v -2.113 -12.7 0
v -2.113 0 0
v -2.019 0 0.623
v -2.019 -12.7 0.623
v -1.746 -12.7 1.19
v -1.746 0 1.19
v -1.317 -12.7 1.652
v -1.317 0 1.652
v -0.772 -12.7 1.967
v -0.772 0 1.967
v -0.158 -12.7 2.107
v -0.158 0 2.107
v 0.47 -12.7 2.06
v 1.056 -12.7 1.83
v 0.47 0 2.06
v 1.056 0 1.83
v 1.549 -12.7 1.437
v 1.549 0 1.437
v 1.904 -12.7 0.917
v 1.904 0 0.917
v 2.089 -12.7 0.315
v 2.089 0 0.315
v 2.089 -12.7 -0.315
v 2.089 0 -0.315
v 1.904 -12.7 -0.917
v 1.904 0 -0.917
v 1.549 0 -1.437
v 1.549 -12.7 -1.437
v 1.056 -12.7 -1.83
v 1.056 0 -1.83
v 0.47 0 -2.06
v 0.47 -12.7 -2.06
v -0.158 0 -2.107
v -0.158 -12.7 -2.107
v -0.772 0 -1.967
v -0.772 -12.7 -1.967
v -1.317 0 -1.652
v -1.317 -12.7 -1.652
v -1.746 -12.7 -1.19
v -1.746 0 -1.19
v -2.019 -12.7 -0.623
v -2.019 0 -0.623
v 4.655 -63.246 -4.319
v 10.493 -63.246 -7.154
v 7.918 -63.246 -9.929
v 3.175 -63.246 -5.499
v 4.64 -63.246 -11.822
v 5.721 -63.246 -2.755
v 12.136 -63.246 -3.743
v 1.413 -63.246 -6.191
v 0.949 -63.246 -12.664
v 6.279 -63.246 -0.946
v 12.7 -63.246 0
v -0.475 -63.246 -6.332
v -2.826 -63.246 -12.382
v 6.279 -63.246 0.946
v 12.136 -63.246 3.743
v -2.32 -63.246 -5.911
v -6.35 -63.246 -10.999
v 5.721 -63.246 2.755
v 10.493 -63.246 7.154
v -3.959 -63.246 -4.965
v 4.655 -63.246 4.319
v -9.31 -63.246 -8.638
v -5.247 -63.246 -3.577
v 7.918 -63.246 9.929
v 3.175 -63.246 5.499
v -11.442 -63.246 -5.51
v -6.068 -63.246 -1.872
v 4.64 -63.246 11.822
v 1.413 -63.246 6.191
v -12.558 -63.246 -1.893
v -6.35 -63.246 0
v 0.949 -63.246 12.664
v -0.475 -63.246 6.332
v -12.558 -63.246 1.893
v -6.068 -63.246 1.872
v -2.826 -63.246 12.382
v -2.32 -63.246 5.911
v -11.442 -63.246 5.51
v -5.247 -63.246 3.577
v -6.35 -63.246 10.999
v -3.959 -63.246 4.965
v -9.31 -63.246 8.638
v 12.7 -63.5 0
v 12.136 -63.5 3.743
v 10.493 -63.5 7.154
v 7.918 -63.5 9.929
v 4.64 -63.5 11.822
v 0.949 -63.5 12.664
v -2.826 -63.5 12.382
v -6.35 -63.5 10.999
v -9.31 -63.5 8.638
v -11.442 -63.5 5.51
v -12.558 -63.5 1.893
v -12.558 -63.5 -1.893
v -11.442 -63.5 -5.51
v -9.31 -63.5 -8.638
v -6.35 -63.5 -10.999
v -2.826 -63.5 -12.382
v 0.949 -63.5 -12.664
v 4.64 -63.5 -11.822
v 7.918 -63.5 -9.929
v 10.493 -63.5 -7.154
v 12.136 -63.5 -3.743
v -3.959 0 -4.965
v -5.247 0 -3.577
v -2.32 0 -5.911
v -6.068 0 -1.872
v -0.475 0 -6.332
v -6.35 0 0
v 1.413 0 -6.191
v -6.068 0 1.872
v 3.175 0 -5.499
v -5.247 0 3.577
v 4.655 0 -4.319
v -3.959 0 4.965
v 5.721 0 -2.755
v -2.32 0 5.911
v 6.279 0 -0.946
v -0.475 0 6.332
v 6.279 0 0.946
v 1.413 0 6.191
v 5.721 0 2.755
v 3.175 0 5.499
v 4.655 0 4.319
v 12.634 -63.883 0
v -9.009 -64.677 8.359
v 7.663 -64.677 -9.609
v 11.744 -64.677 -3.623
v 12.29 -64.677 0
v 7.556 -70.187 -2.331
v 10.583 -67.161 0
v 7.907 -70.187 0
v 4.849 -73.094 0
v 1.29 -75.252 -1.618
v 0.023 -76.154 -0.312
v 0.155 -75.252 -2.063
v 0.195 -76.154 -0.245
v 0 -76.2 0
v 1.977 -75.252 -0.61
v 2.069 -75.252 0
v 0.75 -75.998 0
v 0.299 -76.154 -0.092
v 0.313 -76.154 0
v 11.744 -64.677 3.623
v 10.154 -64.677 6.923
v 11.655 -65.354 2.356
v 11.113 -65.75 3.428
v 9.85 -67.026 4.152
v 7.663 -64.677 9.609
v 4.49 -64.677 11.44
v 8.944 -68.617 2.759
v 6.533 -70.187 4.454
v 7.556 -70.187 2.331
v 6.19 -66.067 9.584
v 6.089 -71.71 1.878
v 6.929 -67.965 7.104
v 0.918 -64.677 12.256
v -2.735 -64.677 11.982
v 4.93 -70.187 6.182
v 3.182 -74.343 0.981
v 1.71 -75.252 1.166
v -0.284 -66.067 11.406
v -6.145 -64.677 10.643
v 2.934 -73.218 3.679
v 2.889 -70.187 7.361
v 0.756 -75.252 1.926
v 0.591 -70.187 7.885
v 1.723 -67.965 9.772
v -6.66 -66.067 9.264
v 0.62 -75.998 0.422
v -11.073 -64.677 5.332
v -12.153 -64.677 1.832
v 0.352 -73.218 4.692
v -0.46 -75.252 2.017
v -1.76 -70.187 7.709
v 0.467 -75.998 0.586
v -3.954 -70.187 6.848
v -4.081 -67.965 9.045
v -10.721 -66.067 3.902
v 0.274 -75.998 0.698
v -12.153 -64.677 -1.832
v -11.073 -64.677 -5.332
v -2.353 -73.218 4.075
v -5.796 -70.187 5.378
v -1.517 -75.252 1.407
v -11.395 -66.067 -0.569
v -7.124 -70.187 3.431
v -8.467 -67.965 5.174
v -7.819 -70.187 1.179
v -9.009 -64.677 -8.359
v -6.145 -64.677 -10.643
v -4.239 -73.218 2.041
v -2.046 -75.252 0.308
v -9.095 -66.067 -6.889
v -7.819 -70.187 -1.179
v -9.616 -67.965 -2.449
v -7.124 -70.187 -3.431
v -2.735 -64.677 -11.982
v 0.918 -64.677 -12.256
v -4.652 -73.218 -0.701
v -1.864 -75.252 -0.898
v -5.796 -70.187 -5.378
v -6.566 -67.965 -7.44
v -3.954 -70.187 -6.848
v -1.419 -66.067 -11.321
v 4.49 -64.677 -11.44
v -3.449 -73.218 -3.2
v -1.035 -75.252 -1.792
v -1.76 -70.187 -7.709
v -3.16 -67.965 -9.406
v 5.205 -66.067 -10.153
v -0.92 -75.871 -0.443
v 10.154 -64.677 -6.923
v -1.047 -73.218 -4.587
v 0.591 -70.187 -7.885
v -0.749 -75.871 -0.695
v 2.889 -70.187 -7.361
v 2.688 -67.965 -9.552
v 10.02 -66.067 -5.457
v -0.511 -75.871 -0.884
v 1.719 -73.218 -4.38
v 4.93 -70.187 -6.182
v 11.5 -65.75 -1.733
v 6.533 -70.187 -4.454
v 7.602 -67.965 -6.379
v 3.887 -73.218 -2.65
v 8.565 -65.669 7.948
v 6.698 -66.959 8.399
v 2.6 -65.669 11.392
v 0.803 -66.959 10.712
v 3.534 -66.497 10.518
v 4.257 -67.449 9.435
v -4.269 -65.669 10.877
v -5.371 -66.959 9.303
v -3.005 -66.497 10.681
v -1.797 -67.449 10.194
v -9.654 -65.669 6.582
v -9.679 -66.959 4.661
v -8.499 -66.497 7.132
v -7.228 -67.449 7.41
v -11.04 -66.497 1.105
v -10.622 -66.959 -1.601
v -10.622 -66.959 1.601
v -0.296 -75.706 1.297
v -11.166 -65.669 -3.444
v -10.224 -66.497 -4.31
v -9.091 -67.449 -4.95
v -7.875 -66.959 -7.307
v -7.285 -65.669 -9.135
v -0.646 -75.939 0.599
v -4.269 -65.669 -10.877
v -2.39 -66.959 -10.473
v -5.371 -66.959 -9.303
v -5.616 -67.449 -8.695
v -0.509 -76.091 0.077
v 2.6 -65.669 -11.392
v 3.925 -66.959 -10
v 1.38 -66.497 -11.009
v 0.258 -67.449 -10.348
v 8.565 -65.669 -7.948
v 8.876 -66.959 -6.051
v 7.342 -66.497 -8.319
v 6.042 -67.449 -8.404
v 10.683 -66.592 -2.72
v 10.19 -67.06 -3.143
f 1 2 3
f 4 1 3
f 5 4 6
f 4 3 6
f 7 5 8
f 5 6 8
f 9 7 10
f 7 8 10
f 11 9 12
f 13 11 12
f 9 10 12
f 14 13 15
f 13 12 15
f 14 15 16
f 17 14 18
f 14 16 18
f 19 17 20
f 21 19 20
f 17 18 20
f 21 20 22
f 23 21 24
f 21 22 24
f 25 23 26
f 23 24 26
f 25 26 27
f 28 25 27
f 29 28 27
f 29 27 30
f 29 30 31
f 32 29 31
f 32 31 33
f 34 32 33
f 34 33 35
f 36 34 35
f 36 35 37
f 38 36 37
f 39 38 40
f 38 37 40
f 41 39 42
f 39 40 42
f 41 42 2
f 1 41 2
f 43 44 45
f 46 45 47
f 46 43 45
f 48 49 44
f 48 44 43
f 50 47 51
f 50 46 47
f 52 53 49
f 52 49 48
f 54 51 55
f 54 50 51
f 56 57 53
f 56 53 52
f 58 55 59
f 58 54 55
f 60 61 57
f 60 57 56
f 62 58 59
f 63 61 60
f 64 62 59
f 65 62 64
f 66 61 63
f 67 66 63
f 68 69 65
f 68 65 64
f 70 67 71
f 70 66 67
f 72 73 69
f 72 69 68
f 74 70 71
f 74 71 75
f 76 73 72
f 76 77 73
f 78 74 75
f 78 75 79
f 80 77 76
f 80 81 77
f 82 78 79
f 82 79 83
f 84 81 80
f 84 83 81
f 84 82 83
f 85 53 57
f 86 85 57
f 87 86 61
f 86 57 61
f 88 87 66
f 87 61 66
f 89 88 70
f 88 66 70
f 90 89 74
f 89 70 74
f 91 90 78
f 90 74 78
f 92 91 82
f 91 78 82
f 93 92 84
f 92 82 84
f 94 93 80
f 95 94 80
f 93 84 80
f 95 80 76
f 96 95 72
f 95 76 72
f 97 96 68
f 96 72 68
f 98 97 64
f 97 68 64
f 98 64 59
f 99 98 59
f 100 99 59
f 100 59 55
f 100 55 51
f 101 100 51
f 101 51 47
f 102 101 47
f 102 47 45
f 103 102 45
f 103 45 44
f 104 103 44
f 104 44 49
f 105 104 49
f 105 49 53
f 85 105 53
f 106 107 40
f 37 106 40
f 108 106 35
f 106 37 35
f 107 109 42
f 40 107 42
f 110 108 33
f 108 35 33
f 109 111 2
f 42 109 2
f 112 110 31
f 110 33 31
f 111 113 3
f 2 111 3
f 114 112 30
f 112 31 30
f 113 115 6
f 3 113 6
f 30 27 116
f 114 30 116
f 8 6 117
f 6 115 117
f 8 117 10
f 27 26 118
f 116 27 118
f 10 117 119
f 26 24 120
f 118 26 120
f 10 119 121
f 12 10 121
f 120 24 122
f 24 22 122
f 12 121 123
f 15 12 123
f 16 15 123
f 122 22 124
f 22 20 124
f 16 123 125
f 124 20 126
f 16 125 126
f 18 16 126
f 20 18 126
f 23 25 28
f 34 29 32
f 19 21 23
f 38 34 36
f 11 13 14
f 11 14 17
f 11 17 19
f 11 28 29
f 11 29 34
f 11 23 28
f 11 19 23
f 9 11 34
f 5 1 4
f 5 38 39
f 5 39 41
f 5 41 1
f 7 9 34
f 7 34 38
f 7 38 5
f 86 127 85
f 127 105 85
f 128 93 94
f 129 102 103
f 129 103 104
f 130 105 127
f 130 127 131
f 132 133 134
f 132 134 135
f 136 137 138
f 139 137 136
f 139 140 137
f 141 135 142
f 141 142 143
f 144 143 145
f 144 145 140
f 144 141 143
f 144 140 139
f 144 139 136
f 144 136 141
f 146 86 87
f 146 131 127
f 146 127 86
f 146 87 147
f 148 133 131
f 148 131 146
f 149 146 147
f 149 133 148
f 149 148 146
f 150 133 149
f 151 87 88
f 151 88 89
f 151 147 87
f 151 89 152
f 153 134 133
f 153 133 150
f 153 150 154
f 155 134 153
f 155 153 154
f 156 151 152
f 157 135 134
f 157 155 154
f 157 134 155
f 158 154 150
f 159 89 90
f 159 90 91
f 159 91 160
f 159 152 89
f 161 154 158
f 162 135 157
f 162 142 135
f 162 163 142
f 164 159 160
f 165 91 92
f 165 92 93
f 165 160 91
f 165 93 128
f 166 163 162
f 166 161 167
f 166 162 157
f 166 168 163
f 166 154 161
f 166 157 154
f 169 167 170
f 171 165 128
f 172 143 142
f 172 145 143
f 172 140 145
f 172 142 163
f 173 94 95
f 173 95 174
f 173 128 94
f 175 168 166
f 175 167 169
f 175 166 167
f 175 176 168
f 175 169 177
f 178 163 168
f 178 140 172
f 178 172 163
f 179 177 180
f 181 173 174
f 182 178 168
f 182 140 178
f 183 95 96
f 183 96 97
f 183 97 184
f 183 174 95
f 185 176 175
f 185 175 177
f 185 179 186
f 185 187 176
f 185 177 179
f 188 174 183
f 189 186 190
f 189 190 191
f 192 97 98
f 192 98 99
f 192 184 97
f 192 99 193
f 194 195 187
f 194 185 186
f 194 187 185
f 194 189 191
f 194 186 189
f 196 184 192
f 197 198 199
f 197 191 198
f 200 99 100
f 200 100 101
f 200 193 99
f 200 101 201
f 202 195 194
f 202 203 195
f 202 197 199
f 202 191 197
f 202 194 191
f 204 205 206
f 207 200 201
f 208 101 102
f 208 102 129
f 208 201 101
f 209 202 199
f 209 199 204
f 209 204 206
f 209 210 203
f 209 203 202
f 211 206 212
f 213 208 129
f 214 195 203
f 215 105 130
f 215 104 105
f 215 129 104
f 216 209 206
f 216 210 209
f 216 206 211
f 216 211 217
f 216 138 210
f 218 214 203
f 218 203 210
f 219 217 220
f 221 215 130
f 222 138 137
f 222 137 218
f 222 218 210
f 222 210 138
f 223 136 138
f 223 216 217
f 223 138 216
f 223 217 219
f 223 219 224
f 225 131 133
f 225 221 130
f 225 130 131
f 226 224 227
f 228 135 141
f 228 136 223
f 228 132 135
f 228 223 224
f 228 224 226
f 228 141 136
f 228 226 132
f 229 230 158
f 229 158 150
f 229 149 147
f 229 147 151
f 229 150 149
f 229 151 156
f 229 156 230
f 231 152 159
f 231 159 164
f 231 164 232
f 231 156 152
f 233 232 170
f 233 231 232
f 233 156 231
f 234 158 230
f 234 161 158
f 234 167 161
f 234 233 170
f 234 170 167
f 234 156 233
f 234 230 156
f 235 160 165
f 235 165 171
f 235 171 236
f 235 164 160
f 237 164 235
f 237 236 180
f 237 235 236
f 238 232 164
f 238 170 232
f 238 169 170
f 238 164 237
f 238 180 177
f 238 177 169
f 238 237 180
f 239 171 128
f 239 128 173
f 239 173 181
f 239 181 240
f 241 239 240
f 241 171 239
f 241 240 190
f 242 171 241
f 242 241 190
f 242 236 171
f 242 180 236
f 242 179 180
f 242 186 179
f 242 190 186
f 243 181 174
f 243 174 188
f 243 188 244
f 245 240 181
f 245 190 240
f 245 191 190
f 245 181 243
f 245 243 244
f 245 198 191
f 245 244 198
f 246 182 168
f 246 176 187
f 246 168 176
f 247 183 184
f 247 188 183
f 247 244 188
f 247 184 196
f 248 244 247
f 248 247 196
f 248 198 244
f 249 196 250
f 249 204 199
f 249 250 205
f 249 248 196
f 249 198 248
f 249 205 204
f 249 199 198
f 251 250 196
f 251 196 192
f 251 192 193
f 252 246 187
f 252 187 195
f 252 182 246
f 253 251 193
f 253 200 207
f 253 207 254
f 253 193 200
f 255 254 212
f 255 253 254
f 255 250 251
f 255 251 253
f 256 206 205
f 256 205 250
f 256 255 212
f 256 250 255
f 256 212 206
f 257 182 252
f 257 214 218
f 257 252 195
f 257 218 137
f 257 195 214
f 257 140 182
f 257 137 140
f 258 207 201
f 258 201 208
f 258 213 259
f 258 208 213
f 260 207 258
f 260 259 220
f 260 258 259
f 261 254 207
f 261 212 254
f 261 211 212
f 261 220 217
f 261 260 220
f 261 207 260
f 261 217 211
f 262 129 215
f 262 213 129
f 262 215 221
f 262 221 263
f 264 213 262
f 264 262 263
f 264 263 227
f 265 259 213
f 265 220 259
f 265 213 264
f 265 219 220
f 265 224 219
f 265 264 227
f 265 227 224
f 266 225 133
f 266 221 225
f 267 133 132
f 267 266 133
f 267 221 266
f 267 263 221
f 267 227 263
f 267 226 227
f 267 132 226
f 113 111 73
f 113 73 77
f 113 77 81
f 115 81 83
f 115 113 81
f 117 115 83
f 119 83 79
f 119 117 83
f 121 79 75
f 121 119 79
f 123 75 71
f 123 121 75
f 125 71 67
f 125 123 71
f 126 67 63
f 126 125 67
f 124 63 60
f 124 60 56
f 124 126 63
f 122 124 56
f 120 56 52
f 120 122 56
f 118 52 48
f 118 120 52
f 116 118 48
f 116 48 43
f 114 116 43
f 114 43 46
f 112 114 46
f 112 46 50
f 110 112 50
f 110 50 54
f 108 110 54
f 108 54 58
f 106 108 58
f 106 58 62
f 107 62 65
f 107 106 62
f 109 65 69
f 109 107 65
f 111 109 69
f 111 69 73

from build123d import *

# Parameters (mm, degrees)
F0_R     = 12.7
F1_DEPTH = 76.2
F3_R     = 12.7
F3_R_2   = 6.35
F4_DEPTH = 63.246
F5_R     = 2.1129626077
F6_DEPTH = 12.7


# Not quite as in the source:
# - a fillet or chamfer that OpenCascade refuses, or shapes differently, is made with other operations: its cross-section is extruded or revolved along the edge and cut away or added


with BuildPart() as f1:
    # F0 (on Front) → F1 (new body)
    with BuildSketch(Plane.XZ):
        Circle(F0_R)
    extrude(amount=F1_DEPTH)

    # F2: fillet of radius 12.7 on 1 edges, made by hand

    # F2_s1 → F2_t2 (revolve, cut)
    with BuildSketch(Plane.XY):
        with BuildLine():
            add(Edge.make_bspline(
                [(12.7, -63.5), (12.7, -76.2), (0, -76.2)],
                knots=[0, 0, 0, 1, 1, 1], degree=2, weights=[1, 0.1764705882, 1]))
            Line((0, -76.2), (12.7, -76.2))
            Line((12.7, -76.2), (12.7, -63.5))
        make_face()
    revolve(axis=Axis((0, -76.2, 0), (0, -1, 0)), mode=Mode.SUBTRACT)

    # F3 (on face) → F4 (cut)
    with BuildSketch(Plane(origin=(0, 0, 0), x_dir=(-1, 0, 0), z_dir=(0, 1, 0))):
        Circle(F3_R)
        Circle(F3_R_2, mode=Mode.SUBTRACT)
    extrude(amount=-F4_DEPTH, mode=Mode.SUBTRACT)

    # F5 (on face) → F6 (cut)
    with BuildSketch(Plane(origin=(0, 0, 0), x_dir=(-1, 0, 0), z_dir=(0, 1, 0))):
        Circle(F5_R)
    extrude(amount=-F6_DEPTH, mode=Mode.SUBTRACT)


solid = f1.part
